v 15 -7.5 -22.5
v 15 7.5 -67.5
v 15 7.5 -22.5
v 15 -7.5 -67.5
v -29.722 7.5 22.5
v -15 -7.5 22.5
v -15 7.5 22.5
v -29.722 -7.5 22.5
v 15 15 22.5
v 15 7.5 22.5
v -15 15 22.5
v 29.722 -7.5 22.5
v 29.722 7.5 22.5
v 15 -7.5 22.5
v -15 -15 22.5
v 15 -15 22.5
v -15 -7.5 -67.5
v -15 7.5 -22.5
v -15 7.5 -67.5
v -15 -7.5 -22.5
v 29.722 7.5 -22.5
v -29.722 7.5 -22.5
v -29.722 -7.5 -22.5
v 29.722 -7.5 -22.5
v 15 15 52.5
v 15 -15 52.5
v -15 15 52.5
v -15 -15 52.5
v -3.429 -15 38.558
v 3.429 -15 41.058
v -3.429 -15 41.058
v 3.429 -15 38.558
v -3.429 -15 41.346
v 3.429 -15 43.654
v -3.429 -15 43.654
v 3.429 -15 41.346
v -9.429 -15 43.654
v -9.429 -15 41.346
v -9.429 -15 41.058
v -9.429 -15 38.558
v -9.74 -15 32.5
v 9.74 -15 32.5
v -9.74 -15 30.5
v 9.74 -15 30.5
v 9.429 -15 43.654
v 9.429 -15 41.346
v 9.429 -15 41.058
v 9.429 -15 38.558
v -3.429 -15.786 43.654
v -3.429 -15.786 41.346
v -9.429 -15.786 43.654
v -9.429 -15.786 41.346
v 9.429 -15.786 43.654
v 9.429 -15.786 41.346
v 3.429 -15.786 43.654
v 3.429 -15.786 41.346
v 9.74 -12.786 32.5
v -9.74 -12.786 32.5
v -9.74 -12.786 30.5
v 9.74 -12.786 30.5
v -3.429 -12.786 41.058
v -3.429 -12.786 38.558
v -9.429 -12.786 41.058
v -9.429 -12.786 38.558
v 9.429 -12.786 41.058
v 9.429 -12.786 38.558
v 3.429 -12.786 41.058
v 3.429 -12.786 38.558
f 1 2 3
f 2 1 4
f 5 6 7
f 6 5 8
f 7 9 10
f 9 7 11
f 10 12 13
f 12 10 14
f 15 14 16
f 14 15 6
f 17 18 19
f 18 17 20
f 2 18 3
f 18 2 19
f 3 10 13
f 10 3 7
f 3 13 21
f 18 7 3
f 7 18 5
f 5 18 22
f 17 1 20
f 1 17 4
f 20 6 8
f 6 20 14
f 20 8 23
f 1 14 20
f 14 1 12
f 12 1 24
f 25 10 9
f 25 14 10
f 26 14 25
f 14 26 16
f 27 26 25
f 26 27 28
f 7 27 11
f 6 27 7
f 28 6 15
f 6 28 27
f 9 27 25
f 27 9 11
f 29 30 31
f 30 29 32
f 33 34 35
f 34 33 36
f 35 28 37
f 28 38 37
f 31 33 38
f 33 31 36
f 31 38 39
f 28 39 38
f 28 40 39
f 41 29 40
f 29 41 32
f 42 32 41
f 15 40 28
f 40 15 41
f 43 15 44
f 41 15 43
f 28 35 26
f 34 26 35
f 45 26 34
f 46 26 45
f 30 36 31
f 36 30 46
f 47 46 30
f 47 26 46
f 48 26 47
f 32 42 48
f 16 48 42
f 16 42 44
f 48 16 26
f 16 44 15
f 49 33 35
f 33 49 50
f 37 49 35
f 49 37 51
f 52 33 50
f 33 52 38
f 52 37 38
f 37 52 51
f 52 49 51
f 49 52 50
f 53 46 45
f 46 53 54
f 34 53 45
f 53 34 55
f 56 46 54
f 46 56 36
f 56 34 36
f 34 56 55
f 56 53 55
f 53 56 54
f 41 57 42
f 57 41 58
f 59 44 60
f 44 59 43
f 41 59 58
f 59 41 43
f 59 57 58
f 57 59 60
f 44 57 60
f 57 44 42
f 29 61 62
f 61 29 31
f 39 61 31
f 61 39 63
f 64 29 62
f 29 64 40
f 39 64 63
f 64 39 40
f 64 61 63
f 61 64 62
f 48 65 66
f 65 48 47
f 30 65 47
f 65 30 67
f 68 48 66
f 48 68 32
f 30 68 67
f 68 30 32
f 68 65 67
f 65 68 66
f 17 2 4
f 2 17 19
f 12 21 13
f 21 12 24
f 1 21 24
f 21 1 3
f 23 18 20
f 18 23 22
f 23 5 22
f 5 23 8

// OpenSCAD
/* [Global] */

// Overall size
size = 15; // [1:1:100]

/* [Head] */
//Rotation left/right
rotationLeftRightHead = 0; // [-130:130]

//Rotation up/down
rotationUpDowntHead = 0; // [-45:45]

//Rotation left eyebrow
rotationLeftEyebrow = 0; // [-10:0.5:10]
//Rotation right eyebrow
rotationRightEyebrow = 0; // [-10:0.5:10]
//Rotation mouth
rotationMouth = 0; // [-20:0.5:20]

/* [Body] */
//Rotation
bodyRotation = 0; // [-45:0.5:45]

/* [Arms] */
//Rotation left arm
rotationLeftArm = 0; // [-90:90]
//Rotation right arm
rotationRightArm = 0; // [-90:90]

/* [Legs] */
//Rotation left leg
rotationLeftLeg = 0; // [-90:90]
//Rotation right leg
rotationRightLeg = 0; // [-90:90]

module arm(size) {
    cube([size, size, size*3], center=true);
}

module leg(size) {
    cube([size, size, size*3], center=true);
    translate([0,0,size*1.5])rotate([0,90,0])cylinder(r=size/2, h=size,center=true);
}

module body(size, rotation) {
    translate([0,0,-size/4])rotate([rotation,0,0]) translate([0,0,size/4]){
    cube([size*2,size,size*3], center=true);
    translate([0,0,-size*1.5])rotate([0,90,0])cylinder(r=size/2, h=size*2, center=true);
    }
}

module head(x,y,z,rle, rre, rlm, rrm, rotationLeftRightHead,rotationUpDowntHead) {
    translate([0,0,-z/2])rotate([rotationUpDowntHead,0,rotationLeftRightHead]) {
        translate([0,0,z/2]) {
    difference() {
        union() {
            //Main head
            cube([x,y,z], center=true);
            //Left eyebrow
            translate([-x/2+x/3.5,-y/2.1,z/6])rotate([0,rle,0])cube([x/5,y/10,z/13], center=true);
            //Right eyebrow
            translate([x/2-x/3.5,-y/2.1,z/6])rotate([0,-rre,0])cube([x/5,y/10,z/13], center=true);
        };
        //Left eye
        translate([-x/2+x/3.5,-y/2.1,z/13])cube([x/5,y/10,z/12], center=true);
        //Right eye
        translate([x/2-x/3.5,-y/2.1,z/13])cube([x/5,y/10,z/12], center=true);
        //Mouth
        translate([0,-y/2.1, -z/5]) {
            translate([-x/7,0,0])rotate([0,rlm,0])cube([x/2.75, y/10, z/15], center=true);//left
            translate([x/7,0,0])rotate([0,-rrm,0])cube([x/2.75, y/10, z/15], center=true);//right
        };
     
    };
       //Mouthfix
    if (rlm > 0) {
        translate([0,-y/2+y/20, -z/3.75]) {
            translate([-x/7,0,0])rotate([0,rlm,0])cube([x/2, y/10, z/15], center=true);//left
            translate([x/7,0,0])rotate([0,-rrm,0])cube([x/2, y/10, z/15], center=true);//right
        };
    } else if (rlm < 0) {
        translate([0,-y/2+y/20, -z/7.5]) {
            translate([-x/7,0,0])rotate([0,rlm,0])cube([x/2, y/10, z/15], center=true);//left
            translate([x/7,0,0])rotate([0,-rrm,0])cube([x/2, y/10, z/15], center=true);//right
        };
    };
}
}
    
}

body(size, bodyRotation);



if (bodyRotation >= 0) {
    
    translate([0,-sin(bodyRotation)*size,size*2.5-sin(bodyRotation)*size])head(size*2, size*2, size*2, rotationLeftEyebrow, rotationRightEyebrow,rotationMouth, rotationMouth,rotationLeftRightHead,rotationUpDowntHead);
    
    translate([size/.675,-sin(bodyRotation)*size*1.25,size-sin(bodyRotation)*size/2])rotate([-rotationLeftArm,0,0])translate([0,0,-size])arm(size);
    translate([-size/.675,-sin(bodyRotation)*size*1.25,size-sin(bodyRotation)*size/2])rotate([-rotationRightArm,0,0])translate([0,0,-size])arm(size);
    
    translate([size/2,sin(bodyRotation)*size*1.25,-size*2+sin(bodyRotation)*size/2+size/2])rotate([-rotationLeftLeg,0,0])translate([0,0,-size*1.5])leg(size);
    translate([-size/2,sin(bodyRotation)*size*1.25,-size*2+sin(bodyRotation)*size/2+size/2])rotate([-rotationRightLeg,0,0])translate([0,0,-size*1.5])leg(size);
    
    
} else {
    translate([0,-sin(bodyRotation)*size,size*2.5+sin(bodyRotation)*size])head(size*2, size*2, size*2, rotationLeftEyebrow, rotationRightEyebrow,rotationMouth, rotationMouth,rotationLeftRightHead,rotationUpDowntHead);
    
    translate([size/.675,-sin(bodyRotation)*size*1.25,size+sin(bodyRotation)*size/2])rotate([-rotationLeftArm,0,0])translate([0,0,-size])arm(size);
    translate([-size/.675,-sin(bodyRotation)*size*1.25,size+sin(bodyRotation)*size/2])rotate([-rotationRightArm,0,0])translate([0,0,-size])arm(size);
    
    translate([size/2,sin(bodyRotation)*size*1.25,-size*2-sin(bodyRotation)*size/2+size/2])rotate([-rotationLeftLeg,0,0])translate([0,0,-size*1.5])leg(size);
    translate([-size/2,sin(bodyRotation)*size*1.25,-size*2-sin(bodyRotation)*size/2+size/2])rotate([-rotationRightLeg,0,0])translate([0,0,-size*1.5])leg(size);
}


